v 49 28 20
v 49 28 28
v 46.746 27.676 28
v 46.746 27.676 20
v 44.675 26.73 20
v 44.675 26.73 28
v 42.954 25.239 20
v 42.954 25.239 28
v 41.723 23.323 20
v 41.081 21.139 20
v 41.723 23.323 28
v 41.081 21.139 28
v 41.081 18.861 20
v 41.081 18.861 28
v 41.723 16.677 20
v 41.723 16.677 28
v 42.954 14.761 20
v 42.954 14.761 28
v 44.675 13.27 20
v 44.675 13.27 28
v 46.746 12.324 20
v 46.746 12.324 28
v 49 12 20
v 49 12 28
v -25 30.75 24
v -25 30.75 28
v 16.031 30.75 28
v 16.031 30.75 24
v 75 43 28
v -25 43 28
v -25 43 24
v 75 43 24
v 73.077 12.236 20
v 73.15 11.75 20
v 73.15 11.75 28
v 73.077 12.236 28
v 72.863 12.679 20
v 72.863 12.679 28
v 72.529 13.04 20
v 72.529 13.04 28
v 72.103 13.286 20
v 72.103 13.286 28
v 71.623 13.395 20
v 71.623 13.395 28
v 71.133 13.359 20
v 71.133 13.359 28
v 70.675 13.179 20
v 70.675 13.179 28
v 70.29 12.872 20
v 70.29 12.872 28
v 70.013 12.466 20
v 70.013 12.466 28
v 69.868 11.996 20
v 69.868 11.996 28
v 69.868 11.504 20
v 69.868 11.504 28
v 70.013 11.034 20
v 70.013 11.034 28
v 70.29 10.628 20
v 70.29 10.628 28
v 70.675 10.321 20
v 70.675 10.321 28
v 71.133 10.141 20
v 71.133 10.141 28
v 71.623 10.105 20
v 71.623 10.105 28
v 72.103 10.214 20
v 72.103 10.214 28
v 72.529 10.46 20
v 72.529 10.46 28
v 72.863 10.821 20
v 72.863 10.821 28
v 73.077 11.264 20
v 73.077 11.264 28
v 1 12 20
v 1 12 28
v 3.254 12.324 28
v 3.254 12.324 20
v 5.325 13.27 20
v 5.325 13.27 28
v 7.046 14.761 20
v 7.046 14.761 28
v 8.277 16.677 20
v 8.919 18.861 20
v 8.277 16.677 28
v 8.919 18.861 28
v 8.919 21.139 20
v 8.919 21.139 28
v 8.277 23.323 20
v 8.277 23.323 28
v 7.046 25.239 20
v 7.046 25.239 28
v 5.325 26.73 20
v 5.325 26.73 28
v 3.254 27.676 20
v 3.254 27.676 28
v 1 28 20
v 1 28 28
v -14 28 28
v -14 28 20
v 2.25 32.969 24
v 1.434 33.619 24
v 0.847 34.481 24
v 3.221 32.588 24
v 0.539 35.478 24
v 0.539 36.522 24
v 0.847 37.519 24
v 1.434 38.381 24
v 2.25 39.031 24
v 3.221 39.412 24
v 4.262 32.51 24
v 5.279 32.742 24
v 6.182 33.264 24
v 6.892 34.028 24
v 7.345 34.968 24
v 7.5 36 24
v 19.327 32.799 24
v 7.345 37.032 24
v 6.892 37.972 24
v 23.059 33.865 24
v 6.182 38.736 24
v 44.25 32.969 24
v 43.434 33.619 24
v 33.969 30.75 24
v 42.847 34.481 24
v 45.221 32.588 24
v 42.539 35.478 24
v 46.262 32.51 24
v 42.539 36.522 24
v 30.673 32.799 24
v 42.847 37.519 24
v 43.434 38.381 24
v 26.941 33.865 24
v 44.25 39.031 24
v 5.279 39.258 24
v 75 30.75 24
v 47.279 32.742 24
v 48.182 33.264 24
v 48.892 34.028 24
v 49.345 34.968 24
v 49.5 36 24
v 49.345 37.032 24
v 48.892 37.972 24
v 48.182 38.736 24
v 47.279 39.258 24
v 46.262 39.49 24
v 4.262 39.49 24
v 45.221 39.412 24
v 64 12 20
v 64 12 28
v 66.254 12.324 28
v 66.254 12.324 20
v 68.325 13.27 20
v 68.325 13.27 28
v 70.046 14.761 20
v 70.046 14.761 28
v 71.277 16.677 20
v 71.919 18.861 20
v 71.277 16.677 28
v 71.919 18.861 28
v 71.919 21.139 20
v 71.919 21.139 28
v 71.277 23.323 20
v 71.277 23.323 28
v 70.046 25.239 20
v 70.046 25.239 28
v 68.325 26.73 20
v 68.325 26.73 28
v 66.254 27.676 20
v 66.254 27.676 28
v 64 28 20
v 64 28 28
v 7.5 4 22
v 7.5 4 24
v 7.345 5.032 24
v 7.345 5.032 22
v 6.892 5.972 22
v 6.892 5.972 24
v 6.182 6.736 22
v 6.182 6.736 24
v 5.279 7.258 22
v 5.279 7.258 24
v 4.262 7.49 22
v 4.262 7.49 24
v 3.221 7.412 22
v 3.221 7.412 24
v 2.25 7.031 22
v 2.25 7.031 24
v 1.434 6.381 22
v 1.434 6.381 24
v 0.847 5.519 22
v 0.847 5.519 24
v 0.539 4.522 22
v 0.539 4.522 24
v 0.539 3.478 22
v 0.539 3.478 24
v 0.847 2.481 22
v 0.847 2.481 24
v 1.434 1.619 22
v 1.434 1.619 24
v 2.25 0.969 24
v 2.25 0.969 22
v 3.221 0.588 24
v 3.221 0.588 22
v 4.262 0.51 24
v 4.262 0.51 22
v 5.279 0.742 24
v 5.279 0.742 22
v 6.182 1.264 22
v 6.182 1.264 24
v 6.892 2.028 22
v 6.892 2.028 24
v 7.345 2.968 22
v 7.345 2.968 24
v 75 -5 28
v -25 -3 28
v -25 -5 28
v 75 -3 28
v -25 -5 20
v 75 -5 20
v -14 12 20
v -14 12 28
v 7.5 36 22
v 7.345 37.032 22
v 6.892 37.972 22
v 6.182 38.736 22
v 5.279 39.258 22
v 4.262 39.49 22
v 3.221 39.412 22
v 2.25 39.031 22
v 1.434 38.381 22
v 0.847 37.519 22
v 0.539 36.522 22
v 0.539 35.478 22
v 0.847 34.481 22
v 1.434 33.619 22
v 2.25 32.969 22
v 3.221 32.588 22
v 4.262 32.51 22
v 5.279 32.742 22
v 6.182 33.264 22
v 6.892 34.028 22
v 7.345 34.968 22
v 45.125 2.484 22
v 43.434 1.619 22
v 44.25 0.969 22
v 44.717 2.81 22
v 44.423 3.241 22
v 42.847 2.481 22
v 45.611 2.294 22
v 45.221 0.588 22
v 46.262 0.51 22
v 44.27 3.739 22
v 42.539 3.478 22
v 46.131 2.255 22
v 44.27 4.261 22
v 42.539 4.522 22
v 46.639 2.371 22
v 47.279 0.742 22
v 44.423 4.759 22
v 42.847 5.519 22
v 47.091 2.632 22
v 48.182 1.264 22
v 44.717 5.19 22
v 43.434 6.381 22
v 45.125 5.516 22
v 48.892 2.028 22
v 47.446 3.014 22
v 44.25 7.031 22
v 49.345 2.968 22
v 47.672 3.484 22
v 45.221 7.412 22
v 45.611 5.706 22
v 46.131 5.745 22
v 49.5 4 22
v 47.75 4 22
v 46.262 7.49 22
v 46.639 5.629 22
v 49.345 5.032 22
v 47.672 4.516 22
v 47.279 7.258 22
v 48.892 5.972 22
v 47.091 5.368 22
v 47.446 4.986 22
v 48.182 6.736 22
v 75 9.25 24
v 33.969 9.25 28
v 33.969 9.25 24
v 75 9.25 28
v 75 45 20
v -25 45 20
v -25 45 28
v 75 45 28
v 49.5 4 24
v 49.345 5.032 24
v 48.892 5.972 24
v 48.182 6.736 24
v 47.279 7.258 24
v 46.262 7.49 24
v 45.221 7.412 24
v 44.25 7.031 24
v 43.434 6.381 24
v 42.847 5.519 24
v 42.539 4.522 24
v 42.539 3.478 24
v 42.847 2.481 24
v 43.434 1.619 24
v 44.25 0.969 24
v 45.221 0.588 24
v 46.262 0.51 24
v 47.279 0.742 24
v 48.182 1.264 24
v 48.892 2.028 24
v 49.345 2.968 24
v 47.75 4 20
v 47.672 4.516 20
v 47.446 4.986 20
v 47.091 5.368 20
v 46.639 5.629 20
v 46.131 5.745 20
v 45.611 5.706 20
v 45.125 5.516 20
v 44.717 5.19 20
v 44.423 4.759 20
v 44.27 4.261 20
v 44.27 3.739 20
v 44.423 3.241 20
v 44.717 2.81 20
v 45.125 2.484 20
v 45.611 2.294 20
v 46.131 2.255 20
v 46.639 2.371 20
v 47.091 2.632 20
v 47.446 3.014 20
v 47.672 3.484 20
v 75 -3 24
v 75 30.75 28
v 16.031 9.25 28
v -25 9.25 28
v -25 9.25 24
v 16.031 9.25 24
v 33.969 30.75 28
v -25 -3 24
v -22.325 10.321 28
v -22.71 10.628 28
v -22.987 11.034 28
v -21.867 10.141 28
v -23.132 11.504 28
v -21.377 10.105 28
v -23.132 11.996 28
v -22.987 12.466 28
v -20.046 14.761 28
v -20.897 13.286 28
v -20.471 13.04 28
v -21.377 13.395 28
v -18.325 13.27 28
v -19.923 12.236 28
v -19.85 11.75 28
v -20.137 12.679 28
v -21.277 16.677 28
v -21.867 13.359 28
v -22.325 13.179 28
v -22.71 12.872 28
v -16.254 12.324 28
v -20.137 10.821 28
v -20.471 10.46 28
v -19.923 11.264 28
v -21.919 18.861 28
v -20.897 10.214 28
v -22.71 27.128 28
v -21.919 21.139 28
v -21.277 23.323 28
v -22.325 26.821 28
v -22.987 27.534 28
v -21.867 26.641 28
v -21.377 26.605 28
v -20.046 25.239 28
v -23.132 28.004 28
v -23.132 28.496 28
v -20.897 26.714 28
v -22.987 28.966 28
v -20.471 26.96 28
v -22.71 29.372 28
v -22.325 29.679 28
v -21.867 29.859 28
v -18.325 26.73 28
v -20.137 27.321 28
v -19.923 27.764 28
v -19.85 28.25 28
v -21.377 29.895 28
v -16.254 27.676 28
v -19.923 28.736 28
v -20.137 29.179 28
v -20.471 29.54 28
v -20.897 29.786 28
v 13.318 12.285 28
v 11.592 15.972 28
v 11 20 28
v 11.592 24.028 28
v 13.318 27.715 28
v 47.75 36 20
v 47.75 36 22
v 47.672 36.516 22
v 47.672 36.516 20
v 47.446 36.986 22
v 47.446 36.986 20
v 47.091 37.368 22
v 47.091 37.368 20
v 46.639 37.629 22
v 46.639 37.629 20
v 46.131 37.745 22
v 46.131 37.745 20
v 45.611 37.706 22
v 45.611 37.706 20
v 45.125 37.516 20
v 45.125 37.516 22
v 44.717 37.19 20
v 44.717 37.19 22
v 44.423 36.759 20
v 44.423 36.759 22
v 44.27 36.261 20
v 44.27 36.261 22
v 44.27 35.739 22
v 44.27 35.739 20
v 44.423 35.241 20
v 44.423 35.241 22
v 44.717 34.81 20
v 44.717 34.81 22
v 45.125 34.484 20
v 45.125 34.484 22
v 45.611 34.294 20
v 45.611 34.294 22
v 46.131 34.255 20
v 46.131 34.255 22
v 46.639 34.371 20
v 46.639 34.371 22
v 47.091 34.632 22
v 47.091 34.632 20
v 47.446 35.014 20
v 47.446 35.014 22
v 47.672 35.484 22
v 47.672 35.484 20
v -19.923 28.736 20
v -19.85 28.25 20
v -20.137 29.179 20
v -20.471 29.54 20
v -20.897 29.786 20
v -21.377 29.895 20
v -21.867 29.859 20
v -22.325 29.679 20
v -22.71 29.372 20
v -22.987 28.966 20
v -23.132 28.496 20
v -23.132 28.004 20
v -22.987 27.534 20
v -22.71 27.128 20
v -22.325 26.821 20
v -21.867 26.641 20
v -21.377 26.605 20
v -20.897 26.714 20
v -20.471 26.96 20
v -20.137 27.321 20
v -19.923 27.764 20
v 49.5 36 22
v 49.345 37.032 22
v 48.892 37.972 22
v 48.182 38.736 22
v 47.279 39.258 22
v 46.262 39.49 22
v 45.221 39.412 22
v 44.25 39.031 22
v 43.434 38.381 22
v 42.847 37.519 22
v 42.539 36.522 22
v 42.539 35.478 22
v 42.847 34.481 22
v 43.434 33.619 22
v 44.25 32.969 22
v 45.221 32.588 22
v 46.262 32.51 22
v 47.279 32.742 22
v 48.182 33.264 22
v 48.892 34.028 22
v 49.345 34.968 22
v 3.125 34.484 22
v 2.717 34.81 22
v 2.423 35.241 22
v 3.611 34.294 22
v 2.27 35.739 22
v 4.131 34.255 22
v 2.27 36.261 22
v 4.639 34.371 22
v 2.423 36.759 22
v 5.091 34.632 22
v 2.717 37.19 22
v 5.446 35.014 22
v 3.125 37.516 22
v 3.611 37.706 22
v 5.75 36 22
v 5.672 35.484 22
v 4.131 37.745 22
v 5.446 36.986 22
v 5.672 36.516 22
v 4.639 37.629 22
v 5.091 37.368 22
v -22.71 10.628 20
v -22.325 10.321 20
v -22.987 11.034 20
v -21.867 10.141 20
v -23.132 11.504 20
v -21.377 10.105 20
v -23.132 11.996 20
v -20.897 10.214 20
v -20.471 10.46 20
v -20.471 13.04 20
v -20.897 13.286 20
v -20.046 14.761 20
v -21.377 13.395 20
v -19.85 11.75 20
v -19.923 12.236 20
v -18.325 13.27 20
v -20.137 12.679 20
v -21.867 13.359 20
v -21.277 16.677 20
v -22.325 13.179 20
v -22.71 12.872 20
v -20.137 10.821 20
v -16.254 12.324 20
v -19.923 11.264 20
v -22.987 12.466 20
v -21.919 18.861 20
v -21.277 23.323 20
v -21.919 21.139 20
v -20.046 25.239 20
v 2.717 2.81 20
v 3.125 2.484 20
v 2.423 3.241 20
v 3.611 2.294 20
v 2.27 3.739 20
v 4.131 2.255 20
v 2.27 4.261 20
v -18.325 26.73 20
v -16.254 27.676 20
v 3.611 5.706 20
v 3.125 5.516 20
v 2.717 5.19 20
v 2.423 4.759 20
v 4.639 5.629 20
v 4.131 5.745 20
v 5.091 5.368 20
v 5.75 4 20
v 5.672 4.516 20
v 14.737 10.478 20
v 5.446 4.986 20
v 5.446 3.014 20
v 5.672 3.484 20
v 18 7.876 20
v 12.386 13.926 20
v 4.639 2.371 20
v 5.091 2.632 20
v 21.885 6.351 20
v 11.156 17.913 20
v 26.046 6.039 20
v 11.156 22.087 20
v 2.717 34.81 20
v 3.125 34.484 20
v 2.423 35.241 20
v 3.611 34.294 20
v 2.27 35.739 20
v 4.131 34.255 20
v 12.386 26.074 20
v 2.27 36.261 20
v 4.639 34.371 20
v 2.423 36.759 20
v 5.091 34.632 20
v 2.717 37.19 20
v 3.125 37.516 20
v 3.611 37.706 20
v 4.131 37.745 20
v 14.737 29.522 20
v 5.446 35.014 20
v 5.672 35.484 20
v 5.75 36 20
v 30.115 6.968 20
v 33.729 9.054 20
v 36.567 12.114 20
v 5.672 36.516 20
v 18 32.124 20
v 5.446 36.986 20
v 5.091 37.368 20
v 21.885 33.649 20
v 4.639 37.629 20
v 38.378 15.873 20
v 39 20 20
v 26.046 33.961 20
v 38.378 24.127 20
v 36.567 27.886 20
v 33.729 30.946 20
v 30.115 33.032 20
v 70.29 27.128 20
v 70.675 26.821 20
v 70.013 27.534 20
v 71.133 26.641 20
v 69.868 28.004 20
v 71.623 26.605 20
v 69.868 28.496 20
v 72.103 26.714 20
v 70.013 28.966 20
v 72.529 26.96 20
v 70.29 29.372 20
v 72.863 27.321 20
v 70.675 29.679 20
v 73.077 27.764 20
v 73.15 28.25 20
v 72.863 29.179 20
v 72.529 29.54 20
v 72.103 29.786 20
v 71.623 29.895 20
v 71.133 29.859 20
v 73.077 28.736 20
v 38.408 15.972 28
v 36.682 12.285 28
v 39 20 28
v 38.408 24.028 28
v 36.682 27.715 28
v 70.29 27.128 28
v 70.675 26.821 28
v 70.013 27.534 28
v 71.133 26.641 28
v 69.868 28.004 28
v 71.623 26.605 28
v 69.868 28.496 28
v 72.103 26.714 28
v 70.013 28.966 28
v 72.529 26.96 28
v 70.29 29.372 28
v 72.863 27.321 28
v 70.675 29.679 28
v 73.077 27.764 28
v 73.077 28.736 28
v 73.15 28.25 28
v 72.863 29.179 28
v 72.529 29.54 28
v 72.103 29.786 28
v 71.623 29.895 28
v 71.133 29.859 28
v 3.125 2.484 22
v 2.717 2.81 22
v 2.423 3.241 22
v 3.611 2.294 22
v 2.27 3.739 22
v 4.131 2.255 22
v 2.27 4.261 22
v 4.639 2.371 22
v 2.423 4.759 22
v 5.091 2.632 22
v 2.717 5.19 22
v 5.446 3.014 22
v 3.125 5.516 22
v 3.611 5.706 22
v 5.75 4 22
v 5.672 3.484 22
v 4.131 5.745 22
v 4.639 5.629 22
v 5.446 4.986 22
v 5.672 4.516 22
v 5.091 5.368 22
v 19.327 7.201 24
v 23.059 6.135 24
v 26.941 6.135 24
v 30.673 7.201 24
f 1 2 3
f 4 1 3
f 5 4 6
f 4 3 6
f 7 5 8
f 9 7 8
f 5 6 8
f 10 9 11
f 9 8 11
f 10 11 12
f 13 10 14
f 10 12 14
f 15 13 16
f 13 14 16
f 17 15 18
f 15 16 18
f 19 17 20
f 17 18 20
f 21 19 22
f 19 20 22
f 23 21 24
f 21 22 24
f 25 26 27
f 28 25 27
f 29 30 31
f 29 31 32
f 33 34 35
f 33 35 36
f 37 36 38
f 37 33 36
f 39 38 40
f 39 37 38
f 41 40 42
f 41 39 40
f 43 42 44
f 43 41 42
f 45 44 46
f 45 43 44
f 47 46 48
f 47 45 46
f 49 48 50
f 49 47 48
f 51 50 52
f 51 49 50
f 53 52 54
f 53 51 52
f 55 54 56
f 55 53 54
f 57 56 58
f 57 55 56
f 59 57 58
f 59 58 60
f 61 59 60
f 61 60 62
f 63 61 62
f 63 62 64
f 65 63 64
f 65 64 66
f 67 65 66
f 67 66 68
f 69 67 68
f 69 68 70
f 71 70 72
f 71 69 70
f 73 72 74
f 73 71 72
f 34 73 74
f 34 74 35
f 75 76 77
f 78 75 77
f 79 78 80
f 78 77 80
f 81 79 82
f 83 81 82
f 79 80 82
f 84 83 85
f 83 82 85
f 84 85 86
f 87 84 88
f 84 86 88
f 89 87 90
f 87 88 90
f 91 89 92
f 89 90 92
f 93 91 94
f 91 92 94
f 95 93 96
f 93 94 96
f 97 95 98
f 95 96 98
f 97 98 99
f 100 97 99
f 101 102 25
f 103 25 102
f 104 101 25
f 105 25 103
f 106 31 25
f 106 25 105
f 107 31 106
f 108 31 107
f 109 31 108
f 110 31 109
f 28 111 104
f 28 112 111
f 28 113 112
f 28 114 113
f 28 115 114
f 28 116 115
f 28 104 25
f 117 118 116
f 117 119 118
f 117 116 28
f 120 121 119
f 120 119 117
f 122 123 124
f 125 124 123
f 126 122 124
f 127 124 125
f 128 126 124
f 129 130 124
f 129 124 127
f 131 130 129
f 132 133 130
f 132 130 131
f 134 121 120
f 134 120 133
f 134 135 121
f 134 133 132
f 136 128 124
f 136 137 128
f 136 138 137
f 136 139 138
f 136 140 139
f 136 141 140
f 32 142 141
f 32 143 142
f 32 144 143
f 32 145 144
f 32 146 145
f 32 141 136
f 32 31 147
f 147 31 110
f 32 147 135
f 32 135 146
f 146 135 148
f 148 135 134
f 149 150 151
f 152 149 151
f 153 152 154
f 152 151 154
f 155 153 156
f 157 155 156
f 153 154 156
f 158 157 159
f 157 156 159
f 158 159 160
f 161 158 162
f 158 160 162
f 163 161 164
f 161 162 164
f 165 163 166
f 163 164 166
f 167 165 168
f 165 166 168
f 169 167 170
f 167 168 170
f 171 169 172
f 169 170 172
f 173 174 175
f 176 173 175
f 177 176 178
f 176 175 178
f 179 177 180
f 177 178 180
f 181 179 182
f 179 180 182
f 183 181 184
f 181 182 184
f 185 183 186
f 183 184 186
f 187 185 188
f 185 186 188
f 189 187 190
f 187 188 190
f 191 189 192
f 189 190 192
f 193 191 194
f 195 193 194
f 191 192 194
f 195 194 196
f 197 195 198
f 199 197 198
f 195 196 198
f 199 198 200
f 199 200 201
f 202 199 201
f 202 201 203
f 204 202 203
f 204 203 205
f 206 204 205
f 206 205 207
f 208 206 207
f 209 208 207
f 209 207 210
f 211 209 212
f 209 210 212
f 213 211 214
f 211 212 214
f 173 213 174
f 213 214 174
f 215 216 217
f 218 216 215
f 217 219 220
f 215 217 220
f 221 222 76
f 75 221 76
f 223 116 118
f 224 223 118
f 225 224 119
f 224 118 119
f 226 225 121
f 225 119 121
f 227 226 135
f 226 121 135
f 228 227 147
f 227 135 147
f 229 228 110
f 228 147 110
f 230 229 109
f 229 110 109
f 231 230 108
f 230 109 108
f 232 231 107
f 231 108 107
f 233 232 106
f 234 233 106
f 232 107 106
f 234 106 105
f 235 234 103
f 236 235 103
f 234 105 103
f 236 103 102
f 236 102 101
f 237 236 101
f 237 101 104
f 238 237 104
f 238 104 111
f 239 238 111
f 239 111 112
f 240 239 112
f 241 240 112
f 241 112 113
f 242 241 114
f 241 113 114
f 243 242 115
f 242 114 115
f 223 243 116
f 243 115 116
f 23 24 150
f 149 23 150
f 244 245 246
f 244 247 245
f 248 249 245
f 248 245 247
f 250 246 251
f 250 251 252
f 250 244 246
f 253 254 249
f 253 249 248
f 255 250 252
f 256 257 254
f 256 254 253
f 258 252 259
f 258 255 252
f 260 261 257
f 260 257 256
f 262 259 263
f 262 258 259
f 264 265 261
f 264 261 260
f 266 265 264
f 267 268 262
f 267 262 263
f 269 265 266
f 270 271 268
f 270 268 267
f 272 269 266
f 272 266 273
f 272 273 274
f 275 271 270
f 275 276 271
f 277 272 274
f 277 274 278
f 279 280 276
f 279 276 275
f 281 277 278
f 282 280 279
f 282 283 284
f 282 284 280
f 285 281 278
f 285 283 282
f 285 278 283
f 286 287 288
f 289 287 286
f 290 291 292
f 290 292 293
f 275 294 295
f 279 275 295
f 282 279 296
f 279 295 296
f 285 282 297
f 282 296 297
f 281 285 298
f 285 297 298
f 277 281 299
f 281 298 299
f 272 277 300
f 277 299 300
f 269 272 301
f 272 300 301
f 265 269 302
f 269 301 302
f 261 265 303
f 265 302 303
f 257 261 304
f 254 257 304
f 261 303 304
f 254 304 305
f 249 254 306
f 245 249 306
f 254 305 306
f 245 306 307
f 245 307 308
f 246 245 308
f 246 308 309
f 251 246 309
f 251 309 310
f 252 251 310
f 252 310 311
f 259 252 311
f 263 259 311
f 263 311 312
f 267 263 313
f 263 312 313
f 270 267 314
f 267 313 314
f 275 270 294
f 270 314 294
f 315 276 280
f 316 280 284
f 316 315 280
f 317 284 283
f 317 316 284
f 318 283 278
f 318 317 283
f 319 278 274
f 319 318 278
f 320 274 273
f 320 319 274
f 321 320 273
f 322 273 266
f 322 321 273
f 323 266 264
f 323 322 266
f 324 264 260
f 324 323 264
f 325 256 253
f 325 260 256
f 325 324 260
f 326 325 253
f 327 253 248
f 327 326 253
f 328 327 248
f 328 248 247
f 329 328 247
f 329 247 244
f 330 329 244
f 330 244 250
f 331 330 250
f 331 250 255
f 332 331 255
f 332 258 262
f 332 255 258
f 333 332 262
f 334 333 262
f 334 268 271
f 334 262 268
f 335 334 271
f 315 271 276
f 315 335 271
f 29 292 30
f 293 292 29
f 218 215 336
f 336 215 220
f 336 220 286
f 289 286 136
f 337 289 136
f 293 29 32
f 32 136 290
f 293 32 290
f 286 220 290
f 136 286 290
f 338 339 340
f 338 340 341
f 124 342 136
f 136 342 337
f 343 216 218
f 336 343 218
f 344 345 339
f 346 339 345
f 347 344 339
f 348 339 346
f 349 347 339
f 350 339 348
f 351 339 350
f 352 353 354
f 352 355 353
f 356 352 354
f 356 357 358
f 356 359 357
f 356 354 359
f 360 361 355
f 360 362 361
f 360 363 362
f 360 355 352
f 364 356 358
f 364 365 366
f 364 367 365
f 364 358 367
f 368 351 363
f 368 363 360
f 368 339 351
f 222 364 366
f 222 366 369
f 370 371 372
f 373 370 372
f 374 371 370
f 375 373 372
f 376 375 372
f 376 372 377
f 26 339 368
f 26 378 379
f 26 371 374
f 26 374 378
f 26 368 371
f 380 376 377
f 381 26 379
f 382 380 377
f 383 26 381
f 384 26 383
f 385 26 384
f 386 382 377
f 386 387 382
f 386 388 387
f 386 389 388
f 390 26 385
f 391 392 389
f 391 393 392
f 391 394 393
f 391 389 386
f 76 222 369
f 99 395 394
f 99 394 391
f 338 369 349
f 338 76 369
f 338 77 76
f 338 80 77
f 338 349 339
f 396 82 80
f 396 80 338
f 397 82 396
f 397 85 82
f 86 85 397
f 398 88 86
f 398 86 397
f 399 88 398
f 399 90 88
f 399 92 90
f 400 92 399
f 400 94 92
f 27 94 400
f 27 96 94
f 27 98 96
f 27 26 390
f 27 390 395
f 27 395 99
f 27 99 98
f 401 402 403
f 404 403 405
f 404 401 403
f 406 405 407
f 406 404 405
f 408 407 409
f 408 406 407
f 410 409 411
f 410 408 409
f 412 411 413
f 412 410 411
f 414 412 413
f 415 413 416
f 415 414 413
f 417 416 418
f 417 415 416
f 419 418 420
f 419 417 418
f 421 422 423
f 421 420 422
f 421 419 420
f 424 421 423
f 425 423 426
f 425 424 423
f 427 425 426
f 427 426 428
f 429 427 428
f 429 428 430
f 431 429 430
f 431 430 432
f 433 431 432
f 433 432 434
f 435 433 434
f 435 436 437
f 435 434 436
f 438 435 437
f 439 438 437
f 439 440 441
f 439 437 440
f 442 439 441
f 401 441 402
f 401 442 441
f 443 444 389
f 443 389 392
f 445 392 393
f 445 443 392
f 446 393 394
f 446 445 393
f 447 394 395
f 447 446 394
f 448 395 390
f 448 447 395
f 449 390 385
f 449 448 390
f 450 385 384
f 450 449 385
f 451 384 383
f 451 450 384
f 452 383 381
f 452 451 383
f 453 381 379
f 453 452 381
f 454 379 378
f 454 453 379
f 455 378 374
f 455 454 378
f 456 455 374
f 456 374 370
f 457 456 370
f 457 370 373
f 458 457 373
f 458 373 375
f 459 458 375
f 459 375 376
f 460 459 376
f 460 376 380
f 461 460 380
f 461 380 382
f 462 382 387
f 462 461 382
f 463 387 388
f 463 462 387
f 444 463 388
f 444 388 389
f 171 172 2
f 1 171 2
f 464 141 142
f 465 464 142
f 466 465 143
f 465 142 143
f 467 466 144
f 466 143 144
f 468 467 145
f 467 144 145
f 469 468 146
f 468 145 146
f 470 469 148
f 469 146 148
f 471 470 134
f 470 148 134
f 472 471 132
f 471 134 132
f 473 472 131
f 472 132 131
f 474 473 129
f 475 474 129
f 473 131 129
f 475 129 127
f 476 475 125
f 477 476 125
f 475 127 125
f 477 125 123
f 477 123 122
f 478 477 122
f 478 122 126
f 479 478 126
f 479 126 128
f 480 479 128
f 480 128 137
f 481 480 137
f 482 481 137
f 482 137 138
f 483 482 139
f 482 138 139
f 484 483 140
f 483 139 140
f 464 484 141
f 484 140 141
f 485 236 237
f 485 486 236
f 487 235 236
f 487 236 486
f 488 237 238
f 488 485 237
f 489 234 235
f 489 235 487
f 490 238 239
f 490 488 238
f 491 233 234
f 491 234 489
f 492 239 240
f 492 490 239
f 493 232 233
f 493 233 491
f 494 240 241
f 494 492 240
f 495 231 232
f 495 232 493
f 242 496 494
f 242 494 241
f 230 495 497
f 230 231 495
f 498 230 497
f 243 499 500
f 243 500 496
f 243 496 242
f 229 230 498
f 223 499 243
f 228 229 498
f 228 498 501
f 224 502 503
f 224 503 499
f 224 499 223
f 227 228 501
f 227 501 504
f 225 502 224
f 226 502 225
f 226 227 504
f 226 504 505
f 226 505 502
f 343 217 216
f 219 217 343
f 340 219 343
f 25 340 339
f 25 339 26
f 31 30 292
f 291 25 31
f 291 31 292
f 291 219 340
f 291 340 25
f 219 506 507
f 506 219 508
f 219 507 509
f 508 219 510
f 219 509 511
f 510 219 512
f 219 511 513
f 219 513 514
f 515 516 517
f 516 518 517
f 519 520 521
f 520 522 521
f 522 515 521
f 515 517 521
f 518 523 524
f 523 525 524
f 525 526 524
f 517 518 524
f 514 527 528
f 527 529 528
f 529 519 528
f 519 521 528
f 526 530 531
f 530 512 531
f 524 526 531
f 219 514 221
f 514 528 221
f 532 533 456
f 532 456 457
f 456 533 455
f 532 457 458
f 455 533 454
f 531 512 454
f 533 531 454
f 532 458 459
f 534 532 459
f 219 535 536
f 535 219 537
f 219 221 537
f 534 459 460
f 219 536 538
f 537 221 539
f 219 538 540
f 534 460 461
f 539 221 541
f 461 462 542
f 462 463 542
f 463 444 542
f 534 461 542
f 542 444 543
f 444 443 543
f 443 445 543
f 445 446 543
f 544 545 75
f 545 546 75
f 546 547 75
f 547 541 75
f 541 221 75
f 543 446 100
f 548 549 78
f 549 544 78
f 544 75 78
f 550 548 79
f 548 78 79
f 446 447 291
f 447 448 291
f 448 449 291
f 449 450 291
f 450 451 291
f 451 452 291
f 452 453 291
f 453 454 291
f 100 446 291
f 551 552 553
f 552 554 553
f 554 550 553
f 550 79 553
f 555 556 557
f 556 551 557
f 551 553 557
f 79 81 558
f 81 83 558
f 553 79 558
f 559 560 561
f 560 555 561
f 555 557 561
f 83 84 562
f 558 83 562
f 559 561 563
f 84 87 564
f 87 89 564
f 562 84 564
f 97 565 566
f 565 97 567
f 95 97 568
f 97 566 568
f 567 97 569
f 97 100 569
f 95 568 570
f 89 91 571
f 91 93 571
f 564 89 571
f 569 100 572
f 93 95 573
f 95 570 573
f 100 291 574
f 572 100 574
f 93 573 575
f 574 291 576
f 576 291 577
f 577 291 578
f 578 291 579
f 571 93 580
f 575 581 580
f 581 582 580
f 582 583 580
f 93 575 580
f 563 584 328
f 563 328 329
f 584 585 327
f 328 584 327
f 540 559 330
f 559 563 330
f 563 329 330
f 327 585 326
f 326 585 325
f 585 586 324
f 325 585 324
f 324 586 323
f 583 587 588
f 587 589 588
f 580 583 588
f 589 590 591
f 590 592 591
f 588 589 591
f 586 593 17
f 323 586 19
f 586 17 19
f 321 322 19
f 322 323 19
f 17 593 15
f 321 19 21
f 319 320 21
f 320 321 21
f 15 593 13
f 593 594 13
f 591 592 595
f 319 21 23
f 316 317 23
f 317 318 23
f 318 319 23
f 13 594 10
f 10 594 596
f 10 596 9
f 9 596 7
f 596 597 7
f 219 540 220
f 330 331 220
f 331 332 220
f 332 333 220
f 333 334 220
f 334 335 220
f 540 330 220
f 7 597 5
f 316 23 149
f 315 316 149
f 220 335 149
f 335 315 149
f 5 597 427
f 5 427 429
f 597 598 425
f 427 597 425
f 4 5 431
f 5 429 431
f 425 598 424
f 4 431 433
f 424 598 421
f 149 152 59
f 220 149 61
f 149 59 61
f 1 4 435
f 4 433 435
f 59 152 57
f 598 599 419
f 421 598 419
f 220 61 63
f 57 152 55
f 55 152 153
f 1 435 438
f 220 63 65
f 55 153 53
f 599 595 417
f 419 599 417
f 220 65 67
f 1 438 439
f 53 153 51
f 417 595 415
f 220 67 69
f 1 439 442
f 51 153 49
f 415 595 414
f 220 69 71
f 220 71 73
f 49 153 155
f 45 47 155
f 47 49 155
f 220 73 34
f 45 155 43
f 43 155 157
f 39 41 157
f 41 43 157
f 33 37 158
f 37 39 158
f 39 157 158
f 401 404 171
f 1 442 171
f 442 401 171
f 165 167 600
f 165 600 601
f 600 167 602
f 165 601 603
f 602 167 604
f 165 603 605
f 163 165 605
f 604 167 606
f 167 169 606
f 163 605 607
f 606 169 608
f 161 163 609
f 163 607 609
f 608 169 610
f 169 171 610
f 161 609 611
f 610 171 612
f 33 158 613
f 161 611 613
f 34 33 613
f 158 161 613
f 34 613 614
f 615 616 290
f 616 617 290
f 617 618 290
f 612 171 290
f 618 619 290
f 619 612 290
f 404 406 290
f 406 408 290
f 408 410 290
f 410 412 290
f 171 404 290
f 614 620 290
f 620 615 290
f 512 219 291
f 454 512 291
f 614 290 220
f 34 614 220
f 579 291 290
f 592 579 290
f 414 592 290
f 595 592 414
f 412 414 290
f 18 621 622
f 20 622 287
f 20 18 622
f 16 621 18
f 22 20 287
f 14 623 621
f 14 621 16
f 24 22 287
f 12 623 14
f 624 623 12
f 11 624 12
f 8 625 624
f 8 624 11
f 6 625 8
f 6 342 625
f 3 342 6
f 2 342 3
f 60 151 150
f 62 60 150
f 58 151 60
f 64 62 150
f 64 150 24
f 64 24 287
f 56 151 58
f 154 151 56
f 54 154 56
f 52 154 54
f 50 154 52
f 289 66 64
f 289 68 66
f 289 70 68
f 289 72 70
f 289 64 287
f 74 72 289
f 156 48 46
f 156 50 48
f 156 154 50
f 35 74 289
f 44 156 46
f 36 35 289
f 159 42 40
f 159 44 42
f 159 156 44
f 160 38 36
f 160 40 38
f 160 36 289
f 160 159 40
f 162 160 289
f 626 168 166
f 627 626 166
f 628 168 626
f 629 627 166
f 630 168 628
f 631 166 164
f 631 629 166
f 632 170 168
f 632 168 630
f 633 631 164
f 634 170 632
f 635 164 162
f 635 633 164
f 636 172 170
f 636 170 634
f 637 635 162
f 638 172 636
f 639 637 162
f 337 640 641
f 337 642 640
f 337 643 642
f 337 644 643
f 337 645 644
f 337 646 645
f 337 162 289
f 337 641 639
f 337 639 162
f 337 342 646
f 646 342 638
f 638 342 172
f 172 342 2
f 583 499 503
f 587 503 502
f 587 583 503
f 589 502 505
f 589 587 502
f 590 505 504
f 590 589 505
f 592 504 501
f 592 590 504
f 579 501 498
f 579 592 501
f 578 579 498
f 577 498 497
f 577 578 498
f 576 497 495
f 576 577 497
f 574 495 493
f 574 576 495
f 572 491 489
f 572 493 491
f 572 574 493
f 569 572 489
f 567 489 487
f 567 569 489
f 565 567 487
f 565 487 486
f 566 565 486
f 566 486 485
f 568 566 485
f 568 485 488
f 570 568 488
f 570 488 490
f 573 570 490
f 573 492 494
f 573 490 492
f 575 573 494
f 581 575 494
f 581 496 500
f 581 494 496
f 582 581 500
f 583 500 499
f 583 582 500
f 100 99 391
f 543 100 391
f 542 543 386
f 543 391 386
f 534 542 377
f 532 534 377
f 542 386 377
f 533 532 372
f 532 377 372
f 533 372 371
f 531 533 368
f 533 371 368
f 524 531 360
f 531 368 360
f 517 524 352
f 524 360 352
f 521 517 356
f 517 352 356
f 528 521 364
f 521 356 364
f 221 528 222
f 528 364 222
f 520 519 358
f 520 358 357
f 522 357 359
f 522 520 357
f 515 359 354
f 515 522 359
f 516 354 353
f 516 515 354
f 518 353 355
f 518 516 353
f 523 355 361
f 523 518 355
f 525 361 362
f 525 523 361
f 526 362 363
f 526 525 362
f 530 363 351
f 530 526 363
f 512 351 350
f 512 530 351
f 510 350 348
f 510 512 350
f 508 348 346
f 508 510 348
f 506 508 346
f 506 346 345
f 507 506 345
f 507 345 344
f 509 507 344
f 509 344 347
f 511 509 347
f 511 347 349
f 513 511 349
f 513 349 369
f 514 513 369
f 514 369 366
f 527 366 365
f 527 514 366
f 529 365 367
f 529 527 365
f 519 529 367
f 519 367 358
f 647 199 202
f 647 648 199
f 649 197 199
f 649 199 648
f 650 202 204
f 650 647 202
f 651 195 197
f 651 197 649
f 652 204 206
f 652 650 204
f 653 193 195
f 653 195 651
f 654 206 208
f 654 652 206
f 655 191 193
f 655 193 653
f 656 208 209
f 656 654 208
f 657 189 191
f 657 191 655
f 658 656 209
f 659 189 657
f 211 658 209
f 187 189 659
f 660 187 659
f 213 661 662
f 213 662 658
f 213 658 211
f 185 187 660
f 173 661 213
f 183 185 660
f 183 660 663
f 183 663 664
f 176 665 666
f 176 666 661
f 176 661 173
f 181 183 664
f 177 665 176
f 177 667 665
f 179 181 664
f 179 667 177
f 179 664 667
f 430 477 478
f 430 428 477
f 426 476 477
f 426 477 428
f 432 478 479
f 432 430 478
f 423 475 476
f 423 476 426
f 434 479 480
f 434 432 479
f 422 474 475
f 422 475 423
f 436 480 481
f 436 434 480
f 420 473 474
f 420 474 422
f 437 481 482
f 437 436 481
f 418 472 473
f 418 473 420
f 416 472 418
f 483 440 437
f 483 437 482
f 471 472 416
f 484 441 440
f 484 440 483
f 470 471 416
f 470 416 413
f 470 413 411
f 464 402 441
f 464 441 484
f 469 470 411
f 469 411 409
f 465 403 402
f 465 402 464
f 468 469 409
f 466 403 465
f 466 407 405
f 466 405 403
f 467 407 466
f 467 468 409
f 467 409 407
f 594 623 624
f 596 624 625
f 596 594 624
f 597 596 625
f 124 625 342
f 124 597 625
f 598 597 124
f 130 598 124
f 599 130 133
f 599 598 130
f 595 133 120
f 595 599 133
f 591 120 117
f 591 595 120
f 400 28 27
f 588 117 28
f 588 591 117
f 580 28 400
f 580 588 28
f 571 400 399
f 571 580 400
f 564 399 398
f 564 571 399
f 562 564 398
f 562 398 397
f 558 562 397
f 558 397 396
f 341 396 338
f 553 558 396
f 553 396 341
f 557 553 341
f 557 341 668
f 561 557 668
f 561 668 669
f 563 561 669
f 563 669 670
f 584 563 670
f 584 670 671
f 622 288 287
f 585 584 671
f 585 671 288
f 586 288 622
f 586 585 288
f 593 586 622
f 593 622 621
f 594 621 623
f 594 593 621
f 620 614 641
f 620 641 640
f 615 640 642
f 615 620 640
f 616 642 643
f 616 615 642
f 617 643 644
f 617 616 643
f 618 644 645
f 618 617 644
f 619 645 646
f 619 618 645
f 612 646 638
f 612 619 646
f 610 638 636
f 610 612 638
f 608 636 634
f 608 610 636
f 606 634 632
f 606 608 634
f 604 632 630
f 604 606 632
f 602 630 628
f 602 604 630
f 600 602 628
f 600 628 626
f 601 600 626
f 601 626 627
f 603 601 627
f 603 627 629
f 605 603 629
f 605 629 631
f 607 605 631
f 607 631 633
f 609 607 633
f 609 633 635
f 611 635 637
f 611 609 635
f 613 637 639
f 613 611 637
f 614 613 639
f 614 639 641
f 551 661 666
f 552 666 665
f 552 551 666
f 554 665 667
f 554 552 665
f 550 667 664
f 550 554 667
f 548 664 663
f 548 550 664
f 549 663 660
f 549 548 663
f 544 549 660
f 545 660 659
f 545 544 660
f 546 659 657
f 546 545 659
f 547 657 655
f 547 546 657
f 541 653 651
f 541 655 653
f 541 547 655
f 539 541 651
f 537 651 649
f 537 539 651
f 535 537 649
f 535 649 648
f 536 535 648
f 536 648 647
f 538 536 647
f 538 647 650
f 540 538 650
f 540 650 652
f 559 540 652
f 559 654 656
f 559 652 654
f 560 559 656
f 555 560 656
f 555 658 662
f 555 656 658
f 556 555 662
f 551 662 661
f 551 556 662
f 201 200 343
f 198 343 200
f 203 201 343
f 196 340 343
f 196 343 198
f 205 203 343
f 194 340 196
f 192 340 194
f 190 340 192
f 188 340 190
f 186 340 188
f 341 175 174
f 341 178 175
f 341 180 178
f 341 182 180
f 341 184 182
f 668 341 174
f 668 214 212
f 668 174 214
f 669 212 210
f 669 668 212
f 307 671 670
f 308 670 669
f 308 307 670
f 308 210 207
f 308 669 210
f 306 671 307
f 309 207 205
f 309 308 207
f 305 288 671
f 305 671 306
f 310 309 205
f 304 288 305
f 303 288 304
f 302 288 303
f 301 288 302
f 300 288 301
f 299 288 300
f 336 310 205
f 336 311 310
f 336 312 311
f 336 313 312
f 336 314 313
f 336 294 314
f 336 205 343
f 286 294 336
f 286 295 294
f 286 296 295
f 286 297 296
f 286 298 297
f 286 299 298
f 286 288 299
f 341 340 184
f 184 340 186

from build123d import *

# Parameters (mm, degrees)
SKETCH292_W     = 100
SKETCH292_H     = 50
SKETCH292_R     = 14
SKETCH292_R_2   = 1.75
SKETCH292_R_3   = 1.65
PAD139_DEPTH    = 8
SKETCH293_W     = 100
SKETCH293_H     = 12.25
POCKET126_DEPTH = 4
POCKET127_DEPTH = 8.001
SKETCH295_R     = 3.5
POCKET128_DEPTH = 2


with BuildPart() as part:
    # Sketch292 → Pad139 (new body)
    with BuildSketch(Plane.XY):
        with Locations((50, 25)):
            Rectangle(SKETCH292_W, SKETCH292_H)
        with Locations((50, 25)):
            Circle(SKETCH292_R, mode=Mode.SUBTRACT)
        with Locations((29, 41)):
            Circle(SKETCH292_R_2, mode=Mode.SUBTRACT)
        with Locations((71, 41)):
            Circle(SKETCH292_R_2, mode=Mode.SUBTRACT)
        with Locations((71, 9)):
            Circle(SKETCH292_R_2, mode=Mode.SUBTRACT)
        with Locations((29, 9)):
            Circle(SKETCH292_R_2, mode=Mode.SUBTRACT)
        with Locations((96.5, 33.25)):
            Circle(SKETCH292_R_3, mode=Mode.SUBTRACT)
        with Locations((3.5, 33.25)):
            Circle(SKETCH292_R_3, mode=Mode.SUBTRACT)
        with Locations((3.5, 16.75)):
            Circle(SKETCH292_R_3, mode=Mode.SUBTRACT)
        with Locations((96.5, 16.75)):
            Circle(SKETCH292_R_3, mode=Mode.SUBTRACT)
    extrude(amount=PAD139_DEPTH)

    # Sketch293 (on Face15 of Pad139) → Pocket126 (cut)
    with BuildSketch(Plane.XY.offset(8)):
        with Locations((50, 41.875)):
            Rectangle(SKETCH293_W, SKETCH293_H)
        with Locations((50, 8.125)):
            Rectangle(SKETCH293_W, SKETCH293_H)
    extrude(amount=-POCKET126_DEPTH, mode=Mode.SUBTRACT)

    # Sketch294 (on Face9 of Pocket126) → Pocket127 (cut, through all)
    with BuildSketch(Plane.XY.offset(8)):
        with BuildLine():
            ThreePointArc((11, 33), (3, 25), (11, 17))
            Line((11, 17), (26, 17))
            ThreePointArc((26, 17), (34, 25), (26, 33))
            Line((26, 33), (11, 33))
        make_face()
        with BuildLine():
            ThreePointArc((74, 33), (66, 25), (74, 17))
            Line((74, 17), (89, 17))
            ThreePointArc((89, 17), (97, 25), (89, 33))
            Line((89, 33), (74, 33))
        make_face()
    extrude(amount=-POCKET127_DEPTH, mode=Mode.SUBTRACT)

    # Sketch295 (on Face11 of Pocket127) → Pocket128 (cut)
    with BuildSketch(Plane.XY.offset(4)):
        with Locations((29, 41)):
            Circle(SKETCH295_R)
        with Locations((71, 41)):
            Circle(SKETCH295_R)
        with Locations((29, 9)):
            Circle(SKETCH295_R)
        with Locations((71, 9)):
            Circle(SKETCH295_R)
    extrude(amount=-POCKET128_DEPTH, mode=Mode.SUBTRACT)


with BuildPart() as part_1:
    # Body103 placement: moved
    add(part.part.moved(Location((-25, -5, 20))))


solid = part_1.part
